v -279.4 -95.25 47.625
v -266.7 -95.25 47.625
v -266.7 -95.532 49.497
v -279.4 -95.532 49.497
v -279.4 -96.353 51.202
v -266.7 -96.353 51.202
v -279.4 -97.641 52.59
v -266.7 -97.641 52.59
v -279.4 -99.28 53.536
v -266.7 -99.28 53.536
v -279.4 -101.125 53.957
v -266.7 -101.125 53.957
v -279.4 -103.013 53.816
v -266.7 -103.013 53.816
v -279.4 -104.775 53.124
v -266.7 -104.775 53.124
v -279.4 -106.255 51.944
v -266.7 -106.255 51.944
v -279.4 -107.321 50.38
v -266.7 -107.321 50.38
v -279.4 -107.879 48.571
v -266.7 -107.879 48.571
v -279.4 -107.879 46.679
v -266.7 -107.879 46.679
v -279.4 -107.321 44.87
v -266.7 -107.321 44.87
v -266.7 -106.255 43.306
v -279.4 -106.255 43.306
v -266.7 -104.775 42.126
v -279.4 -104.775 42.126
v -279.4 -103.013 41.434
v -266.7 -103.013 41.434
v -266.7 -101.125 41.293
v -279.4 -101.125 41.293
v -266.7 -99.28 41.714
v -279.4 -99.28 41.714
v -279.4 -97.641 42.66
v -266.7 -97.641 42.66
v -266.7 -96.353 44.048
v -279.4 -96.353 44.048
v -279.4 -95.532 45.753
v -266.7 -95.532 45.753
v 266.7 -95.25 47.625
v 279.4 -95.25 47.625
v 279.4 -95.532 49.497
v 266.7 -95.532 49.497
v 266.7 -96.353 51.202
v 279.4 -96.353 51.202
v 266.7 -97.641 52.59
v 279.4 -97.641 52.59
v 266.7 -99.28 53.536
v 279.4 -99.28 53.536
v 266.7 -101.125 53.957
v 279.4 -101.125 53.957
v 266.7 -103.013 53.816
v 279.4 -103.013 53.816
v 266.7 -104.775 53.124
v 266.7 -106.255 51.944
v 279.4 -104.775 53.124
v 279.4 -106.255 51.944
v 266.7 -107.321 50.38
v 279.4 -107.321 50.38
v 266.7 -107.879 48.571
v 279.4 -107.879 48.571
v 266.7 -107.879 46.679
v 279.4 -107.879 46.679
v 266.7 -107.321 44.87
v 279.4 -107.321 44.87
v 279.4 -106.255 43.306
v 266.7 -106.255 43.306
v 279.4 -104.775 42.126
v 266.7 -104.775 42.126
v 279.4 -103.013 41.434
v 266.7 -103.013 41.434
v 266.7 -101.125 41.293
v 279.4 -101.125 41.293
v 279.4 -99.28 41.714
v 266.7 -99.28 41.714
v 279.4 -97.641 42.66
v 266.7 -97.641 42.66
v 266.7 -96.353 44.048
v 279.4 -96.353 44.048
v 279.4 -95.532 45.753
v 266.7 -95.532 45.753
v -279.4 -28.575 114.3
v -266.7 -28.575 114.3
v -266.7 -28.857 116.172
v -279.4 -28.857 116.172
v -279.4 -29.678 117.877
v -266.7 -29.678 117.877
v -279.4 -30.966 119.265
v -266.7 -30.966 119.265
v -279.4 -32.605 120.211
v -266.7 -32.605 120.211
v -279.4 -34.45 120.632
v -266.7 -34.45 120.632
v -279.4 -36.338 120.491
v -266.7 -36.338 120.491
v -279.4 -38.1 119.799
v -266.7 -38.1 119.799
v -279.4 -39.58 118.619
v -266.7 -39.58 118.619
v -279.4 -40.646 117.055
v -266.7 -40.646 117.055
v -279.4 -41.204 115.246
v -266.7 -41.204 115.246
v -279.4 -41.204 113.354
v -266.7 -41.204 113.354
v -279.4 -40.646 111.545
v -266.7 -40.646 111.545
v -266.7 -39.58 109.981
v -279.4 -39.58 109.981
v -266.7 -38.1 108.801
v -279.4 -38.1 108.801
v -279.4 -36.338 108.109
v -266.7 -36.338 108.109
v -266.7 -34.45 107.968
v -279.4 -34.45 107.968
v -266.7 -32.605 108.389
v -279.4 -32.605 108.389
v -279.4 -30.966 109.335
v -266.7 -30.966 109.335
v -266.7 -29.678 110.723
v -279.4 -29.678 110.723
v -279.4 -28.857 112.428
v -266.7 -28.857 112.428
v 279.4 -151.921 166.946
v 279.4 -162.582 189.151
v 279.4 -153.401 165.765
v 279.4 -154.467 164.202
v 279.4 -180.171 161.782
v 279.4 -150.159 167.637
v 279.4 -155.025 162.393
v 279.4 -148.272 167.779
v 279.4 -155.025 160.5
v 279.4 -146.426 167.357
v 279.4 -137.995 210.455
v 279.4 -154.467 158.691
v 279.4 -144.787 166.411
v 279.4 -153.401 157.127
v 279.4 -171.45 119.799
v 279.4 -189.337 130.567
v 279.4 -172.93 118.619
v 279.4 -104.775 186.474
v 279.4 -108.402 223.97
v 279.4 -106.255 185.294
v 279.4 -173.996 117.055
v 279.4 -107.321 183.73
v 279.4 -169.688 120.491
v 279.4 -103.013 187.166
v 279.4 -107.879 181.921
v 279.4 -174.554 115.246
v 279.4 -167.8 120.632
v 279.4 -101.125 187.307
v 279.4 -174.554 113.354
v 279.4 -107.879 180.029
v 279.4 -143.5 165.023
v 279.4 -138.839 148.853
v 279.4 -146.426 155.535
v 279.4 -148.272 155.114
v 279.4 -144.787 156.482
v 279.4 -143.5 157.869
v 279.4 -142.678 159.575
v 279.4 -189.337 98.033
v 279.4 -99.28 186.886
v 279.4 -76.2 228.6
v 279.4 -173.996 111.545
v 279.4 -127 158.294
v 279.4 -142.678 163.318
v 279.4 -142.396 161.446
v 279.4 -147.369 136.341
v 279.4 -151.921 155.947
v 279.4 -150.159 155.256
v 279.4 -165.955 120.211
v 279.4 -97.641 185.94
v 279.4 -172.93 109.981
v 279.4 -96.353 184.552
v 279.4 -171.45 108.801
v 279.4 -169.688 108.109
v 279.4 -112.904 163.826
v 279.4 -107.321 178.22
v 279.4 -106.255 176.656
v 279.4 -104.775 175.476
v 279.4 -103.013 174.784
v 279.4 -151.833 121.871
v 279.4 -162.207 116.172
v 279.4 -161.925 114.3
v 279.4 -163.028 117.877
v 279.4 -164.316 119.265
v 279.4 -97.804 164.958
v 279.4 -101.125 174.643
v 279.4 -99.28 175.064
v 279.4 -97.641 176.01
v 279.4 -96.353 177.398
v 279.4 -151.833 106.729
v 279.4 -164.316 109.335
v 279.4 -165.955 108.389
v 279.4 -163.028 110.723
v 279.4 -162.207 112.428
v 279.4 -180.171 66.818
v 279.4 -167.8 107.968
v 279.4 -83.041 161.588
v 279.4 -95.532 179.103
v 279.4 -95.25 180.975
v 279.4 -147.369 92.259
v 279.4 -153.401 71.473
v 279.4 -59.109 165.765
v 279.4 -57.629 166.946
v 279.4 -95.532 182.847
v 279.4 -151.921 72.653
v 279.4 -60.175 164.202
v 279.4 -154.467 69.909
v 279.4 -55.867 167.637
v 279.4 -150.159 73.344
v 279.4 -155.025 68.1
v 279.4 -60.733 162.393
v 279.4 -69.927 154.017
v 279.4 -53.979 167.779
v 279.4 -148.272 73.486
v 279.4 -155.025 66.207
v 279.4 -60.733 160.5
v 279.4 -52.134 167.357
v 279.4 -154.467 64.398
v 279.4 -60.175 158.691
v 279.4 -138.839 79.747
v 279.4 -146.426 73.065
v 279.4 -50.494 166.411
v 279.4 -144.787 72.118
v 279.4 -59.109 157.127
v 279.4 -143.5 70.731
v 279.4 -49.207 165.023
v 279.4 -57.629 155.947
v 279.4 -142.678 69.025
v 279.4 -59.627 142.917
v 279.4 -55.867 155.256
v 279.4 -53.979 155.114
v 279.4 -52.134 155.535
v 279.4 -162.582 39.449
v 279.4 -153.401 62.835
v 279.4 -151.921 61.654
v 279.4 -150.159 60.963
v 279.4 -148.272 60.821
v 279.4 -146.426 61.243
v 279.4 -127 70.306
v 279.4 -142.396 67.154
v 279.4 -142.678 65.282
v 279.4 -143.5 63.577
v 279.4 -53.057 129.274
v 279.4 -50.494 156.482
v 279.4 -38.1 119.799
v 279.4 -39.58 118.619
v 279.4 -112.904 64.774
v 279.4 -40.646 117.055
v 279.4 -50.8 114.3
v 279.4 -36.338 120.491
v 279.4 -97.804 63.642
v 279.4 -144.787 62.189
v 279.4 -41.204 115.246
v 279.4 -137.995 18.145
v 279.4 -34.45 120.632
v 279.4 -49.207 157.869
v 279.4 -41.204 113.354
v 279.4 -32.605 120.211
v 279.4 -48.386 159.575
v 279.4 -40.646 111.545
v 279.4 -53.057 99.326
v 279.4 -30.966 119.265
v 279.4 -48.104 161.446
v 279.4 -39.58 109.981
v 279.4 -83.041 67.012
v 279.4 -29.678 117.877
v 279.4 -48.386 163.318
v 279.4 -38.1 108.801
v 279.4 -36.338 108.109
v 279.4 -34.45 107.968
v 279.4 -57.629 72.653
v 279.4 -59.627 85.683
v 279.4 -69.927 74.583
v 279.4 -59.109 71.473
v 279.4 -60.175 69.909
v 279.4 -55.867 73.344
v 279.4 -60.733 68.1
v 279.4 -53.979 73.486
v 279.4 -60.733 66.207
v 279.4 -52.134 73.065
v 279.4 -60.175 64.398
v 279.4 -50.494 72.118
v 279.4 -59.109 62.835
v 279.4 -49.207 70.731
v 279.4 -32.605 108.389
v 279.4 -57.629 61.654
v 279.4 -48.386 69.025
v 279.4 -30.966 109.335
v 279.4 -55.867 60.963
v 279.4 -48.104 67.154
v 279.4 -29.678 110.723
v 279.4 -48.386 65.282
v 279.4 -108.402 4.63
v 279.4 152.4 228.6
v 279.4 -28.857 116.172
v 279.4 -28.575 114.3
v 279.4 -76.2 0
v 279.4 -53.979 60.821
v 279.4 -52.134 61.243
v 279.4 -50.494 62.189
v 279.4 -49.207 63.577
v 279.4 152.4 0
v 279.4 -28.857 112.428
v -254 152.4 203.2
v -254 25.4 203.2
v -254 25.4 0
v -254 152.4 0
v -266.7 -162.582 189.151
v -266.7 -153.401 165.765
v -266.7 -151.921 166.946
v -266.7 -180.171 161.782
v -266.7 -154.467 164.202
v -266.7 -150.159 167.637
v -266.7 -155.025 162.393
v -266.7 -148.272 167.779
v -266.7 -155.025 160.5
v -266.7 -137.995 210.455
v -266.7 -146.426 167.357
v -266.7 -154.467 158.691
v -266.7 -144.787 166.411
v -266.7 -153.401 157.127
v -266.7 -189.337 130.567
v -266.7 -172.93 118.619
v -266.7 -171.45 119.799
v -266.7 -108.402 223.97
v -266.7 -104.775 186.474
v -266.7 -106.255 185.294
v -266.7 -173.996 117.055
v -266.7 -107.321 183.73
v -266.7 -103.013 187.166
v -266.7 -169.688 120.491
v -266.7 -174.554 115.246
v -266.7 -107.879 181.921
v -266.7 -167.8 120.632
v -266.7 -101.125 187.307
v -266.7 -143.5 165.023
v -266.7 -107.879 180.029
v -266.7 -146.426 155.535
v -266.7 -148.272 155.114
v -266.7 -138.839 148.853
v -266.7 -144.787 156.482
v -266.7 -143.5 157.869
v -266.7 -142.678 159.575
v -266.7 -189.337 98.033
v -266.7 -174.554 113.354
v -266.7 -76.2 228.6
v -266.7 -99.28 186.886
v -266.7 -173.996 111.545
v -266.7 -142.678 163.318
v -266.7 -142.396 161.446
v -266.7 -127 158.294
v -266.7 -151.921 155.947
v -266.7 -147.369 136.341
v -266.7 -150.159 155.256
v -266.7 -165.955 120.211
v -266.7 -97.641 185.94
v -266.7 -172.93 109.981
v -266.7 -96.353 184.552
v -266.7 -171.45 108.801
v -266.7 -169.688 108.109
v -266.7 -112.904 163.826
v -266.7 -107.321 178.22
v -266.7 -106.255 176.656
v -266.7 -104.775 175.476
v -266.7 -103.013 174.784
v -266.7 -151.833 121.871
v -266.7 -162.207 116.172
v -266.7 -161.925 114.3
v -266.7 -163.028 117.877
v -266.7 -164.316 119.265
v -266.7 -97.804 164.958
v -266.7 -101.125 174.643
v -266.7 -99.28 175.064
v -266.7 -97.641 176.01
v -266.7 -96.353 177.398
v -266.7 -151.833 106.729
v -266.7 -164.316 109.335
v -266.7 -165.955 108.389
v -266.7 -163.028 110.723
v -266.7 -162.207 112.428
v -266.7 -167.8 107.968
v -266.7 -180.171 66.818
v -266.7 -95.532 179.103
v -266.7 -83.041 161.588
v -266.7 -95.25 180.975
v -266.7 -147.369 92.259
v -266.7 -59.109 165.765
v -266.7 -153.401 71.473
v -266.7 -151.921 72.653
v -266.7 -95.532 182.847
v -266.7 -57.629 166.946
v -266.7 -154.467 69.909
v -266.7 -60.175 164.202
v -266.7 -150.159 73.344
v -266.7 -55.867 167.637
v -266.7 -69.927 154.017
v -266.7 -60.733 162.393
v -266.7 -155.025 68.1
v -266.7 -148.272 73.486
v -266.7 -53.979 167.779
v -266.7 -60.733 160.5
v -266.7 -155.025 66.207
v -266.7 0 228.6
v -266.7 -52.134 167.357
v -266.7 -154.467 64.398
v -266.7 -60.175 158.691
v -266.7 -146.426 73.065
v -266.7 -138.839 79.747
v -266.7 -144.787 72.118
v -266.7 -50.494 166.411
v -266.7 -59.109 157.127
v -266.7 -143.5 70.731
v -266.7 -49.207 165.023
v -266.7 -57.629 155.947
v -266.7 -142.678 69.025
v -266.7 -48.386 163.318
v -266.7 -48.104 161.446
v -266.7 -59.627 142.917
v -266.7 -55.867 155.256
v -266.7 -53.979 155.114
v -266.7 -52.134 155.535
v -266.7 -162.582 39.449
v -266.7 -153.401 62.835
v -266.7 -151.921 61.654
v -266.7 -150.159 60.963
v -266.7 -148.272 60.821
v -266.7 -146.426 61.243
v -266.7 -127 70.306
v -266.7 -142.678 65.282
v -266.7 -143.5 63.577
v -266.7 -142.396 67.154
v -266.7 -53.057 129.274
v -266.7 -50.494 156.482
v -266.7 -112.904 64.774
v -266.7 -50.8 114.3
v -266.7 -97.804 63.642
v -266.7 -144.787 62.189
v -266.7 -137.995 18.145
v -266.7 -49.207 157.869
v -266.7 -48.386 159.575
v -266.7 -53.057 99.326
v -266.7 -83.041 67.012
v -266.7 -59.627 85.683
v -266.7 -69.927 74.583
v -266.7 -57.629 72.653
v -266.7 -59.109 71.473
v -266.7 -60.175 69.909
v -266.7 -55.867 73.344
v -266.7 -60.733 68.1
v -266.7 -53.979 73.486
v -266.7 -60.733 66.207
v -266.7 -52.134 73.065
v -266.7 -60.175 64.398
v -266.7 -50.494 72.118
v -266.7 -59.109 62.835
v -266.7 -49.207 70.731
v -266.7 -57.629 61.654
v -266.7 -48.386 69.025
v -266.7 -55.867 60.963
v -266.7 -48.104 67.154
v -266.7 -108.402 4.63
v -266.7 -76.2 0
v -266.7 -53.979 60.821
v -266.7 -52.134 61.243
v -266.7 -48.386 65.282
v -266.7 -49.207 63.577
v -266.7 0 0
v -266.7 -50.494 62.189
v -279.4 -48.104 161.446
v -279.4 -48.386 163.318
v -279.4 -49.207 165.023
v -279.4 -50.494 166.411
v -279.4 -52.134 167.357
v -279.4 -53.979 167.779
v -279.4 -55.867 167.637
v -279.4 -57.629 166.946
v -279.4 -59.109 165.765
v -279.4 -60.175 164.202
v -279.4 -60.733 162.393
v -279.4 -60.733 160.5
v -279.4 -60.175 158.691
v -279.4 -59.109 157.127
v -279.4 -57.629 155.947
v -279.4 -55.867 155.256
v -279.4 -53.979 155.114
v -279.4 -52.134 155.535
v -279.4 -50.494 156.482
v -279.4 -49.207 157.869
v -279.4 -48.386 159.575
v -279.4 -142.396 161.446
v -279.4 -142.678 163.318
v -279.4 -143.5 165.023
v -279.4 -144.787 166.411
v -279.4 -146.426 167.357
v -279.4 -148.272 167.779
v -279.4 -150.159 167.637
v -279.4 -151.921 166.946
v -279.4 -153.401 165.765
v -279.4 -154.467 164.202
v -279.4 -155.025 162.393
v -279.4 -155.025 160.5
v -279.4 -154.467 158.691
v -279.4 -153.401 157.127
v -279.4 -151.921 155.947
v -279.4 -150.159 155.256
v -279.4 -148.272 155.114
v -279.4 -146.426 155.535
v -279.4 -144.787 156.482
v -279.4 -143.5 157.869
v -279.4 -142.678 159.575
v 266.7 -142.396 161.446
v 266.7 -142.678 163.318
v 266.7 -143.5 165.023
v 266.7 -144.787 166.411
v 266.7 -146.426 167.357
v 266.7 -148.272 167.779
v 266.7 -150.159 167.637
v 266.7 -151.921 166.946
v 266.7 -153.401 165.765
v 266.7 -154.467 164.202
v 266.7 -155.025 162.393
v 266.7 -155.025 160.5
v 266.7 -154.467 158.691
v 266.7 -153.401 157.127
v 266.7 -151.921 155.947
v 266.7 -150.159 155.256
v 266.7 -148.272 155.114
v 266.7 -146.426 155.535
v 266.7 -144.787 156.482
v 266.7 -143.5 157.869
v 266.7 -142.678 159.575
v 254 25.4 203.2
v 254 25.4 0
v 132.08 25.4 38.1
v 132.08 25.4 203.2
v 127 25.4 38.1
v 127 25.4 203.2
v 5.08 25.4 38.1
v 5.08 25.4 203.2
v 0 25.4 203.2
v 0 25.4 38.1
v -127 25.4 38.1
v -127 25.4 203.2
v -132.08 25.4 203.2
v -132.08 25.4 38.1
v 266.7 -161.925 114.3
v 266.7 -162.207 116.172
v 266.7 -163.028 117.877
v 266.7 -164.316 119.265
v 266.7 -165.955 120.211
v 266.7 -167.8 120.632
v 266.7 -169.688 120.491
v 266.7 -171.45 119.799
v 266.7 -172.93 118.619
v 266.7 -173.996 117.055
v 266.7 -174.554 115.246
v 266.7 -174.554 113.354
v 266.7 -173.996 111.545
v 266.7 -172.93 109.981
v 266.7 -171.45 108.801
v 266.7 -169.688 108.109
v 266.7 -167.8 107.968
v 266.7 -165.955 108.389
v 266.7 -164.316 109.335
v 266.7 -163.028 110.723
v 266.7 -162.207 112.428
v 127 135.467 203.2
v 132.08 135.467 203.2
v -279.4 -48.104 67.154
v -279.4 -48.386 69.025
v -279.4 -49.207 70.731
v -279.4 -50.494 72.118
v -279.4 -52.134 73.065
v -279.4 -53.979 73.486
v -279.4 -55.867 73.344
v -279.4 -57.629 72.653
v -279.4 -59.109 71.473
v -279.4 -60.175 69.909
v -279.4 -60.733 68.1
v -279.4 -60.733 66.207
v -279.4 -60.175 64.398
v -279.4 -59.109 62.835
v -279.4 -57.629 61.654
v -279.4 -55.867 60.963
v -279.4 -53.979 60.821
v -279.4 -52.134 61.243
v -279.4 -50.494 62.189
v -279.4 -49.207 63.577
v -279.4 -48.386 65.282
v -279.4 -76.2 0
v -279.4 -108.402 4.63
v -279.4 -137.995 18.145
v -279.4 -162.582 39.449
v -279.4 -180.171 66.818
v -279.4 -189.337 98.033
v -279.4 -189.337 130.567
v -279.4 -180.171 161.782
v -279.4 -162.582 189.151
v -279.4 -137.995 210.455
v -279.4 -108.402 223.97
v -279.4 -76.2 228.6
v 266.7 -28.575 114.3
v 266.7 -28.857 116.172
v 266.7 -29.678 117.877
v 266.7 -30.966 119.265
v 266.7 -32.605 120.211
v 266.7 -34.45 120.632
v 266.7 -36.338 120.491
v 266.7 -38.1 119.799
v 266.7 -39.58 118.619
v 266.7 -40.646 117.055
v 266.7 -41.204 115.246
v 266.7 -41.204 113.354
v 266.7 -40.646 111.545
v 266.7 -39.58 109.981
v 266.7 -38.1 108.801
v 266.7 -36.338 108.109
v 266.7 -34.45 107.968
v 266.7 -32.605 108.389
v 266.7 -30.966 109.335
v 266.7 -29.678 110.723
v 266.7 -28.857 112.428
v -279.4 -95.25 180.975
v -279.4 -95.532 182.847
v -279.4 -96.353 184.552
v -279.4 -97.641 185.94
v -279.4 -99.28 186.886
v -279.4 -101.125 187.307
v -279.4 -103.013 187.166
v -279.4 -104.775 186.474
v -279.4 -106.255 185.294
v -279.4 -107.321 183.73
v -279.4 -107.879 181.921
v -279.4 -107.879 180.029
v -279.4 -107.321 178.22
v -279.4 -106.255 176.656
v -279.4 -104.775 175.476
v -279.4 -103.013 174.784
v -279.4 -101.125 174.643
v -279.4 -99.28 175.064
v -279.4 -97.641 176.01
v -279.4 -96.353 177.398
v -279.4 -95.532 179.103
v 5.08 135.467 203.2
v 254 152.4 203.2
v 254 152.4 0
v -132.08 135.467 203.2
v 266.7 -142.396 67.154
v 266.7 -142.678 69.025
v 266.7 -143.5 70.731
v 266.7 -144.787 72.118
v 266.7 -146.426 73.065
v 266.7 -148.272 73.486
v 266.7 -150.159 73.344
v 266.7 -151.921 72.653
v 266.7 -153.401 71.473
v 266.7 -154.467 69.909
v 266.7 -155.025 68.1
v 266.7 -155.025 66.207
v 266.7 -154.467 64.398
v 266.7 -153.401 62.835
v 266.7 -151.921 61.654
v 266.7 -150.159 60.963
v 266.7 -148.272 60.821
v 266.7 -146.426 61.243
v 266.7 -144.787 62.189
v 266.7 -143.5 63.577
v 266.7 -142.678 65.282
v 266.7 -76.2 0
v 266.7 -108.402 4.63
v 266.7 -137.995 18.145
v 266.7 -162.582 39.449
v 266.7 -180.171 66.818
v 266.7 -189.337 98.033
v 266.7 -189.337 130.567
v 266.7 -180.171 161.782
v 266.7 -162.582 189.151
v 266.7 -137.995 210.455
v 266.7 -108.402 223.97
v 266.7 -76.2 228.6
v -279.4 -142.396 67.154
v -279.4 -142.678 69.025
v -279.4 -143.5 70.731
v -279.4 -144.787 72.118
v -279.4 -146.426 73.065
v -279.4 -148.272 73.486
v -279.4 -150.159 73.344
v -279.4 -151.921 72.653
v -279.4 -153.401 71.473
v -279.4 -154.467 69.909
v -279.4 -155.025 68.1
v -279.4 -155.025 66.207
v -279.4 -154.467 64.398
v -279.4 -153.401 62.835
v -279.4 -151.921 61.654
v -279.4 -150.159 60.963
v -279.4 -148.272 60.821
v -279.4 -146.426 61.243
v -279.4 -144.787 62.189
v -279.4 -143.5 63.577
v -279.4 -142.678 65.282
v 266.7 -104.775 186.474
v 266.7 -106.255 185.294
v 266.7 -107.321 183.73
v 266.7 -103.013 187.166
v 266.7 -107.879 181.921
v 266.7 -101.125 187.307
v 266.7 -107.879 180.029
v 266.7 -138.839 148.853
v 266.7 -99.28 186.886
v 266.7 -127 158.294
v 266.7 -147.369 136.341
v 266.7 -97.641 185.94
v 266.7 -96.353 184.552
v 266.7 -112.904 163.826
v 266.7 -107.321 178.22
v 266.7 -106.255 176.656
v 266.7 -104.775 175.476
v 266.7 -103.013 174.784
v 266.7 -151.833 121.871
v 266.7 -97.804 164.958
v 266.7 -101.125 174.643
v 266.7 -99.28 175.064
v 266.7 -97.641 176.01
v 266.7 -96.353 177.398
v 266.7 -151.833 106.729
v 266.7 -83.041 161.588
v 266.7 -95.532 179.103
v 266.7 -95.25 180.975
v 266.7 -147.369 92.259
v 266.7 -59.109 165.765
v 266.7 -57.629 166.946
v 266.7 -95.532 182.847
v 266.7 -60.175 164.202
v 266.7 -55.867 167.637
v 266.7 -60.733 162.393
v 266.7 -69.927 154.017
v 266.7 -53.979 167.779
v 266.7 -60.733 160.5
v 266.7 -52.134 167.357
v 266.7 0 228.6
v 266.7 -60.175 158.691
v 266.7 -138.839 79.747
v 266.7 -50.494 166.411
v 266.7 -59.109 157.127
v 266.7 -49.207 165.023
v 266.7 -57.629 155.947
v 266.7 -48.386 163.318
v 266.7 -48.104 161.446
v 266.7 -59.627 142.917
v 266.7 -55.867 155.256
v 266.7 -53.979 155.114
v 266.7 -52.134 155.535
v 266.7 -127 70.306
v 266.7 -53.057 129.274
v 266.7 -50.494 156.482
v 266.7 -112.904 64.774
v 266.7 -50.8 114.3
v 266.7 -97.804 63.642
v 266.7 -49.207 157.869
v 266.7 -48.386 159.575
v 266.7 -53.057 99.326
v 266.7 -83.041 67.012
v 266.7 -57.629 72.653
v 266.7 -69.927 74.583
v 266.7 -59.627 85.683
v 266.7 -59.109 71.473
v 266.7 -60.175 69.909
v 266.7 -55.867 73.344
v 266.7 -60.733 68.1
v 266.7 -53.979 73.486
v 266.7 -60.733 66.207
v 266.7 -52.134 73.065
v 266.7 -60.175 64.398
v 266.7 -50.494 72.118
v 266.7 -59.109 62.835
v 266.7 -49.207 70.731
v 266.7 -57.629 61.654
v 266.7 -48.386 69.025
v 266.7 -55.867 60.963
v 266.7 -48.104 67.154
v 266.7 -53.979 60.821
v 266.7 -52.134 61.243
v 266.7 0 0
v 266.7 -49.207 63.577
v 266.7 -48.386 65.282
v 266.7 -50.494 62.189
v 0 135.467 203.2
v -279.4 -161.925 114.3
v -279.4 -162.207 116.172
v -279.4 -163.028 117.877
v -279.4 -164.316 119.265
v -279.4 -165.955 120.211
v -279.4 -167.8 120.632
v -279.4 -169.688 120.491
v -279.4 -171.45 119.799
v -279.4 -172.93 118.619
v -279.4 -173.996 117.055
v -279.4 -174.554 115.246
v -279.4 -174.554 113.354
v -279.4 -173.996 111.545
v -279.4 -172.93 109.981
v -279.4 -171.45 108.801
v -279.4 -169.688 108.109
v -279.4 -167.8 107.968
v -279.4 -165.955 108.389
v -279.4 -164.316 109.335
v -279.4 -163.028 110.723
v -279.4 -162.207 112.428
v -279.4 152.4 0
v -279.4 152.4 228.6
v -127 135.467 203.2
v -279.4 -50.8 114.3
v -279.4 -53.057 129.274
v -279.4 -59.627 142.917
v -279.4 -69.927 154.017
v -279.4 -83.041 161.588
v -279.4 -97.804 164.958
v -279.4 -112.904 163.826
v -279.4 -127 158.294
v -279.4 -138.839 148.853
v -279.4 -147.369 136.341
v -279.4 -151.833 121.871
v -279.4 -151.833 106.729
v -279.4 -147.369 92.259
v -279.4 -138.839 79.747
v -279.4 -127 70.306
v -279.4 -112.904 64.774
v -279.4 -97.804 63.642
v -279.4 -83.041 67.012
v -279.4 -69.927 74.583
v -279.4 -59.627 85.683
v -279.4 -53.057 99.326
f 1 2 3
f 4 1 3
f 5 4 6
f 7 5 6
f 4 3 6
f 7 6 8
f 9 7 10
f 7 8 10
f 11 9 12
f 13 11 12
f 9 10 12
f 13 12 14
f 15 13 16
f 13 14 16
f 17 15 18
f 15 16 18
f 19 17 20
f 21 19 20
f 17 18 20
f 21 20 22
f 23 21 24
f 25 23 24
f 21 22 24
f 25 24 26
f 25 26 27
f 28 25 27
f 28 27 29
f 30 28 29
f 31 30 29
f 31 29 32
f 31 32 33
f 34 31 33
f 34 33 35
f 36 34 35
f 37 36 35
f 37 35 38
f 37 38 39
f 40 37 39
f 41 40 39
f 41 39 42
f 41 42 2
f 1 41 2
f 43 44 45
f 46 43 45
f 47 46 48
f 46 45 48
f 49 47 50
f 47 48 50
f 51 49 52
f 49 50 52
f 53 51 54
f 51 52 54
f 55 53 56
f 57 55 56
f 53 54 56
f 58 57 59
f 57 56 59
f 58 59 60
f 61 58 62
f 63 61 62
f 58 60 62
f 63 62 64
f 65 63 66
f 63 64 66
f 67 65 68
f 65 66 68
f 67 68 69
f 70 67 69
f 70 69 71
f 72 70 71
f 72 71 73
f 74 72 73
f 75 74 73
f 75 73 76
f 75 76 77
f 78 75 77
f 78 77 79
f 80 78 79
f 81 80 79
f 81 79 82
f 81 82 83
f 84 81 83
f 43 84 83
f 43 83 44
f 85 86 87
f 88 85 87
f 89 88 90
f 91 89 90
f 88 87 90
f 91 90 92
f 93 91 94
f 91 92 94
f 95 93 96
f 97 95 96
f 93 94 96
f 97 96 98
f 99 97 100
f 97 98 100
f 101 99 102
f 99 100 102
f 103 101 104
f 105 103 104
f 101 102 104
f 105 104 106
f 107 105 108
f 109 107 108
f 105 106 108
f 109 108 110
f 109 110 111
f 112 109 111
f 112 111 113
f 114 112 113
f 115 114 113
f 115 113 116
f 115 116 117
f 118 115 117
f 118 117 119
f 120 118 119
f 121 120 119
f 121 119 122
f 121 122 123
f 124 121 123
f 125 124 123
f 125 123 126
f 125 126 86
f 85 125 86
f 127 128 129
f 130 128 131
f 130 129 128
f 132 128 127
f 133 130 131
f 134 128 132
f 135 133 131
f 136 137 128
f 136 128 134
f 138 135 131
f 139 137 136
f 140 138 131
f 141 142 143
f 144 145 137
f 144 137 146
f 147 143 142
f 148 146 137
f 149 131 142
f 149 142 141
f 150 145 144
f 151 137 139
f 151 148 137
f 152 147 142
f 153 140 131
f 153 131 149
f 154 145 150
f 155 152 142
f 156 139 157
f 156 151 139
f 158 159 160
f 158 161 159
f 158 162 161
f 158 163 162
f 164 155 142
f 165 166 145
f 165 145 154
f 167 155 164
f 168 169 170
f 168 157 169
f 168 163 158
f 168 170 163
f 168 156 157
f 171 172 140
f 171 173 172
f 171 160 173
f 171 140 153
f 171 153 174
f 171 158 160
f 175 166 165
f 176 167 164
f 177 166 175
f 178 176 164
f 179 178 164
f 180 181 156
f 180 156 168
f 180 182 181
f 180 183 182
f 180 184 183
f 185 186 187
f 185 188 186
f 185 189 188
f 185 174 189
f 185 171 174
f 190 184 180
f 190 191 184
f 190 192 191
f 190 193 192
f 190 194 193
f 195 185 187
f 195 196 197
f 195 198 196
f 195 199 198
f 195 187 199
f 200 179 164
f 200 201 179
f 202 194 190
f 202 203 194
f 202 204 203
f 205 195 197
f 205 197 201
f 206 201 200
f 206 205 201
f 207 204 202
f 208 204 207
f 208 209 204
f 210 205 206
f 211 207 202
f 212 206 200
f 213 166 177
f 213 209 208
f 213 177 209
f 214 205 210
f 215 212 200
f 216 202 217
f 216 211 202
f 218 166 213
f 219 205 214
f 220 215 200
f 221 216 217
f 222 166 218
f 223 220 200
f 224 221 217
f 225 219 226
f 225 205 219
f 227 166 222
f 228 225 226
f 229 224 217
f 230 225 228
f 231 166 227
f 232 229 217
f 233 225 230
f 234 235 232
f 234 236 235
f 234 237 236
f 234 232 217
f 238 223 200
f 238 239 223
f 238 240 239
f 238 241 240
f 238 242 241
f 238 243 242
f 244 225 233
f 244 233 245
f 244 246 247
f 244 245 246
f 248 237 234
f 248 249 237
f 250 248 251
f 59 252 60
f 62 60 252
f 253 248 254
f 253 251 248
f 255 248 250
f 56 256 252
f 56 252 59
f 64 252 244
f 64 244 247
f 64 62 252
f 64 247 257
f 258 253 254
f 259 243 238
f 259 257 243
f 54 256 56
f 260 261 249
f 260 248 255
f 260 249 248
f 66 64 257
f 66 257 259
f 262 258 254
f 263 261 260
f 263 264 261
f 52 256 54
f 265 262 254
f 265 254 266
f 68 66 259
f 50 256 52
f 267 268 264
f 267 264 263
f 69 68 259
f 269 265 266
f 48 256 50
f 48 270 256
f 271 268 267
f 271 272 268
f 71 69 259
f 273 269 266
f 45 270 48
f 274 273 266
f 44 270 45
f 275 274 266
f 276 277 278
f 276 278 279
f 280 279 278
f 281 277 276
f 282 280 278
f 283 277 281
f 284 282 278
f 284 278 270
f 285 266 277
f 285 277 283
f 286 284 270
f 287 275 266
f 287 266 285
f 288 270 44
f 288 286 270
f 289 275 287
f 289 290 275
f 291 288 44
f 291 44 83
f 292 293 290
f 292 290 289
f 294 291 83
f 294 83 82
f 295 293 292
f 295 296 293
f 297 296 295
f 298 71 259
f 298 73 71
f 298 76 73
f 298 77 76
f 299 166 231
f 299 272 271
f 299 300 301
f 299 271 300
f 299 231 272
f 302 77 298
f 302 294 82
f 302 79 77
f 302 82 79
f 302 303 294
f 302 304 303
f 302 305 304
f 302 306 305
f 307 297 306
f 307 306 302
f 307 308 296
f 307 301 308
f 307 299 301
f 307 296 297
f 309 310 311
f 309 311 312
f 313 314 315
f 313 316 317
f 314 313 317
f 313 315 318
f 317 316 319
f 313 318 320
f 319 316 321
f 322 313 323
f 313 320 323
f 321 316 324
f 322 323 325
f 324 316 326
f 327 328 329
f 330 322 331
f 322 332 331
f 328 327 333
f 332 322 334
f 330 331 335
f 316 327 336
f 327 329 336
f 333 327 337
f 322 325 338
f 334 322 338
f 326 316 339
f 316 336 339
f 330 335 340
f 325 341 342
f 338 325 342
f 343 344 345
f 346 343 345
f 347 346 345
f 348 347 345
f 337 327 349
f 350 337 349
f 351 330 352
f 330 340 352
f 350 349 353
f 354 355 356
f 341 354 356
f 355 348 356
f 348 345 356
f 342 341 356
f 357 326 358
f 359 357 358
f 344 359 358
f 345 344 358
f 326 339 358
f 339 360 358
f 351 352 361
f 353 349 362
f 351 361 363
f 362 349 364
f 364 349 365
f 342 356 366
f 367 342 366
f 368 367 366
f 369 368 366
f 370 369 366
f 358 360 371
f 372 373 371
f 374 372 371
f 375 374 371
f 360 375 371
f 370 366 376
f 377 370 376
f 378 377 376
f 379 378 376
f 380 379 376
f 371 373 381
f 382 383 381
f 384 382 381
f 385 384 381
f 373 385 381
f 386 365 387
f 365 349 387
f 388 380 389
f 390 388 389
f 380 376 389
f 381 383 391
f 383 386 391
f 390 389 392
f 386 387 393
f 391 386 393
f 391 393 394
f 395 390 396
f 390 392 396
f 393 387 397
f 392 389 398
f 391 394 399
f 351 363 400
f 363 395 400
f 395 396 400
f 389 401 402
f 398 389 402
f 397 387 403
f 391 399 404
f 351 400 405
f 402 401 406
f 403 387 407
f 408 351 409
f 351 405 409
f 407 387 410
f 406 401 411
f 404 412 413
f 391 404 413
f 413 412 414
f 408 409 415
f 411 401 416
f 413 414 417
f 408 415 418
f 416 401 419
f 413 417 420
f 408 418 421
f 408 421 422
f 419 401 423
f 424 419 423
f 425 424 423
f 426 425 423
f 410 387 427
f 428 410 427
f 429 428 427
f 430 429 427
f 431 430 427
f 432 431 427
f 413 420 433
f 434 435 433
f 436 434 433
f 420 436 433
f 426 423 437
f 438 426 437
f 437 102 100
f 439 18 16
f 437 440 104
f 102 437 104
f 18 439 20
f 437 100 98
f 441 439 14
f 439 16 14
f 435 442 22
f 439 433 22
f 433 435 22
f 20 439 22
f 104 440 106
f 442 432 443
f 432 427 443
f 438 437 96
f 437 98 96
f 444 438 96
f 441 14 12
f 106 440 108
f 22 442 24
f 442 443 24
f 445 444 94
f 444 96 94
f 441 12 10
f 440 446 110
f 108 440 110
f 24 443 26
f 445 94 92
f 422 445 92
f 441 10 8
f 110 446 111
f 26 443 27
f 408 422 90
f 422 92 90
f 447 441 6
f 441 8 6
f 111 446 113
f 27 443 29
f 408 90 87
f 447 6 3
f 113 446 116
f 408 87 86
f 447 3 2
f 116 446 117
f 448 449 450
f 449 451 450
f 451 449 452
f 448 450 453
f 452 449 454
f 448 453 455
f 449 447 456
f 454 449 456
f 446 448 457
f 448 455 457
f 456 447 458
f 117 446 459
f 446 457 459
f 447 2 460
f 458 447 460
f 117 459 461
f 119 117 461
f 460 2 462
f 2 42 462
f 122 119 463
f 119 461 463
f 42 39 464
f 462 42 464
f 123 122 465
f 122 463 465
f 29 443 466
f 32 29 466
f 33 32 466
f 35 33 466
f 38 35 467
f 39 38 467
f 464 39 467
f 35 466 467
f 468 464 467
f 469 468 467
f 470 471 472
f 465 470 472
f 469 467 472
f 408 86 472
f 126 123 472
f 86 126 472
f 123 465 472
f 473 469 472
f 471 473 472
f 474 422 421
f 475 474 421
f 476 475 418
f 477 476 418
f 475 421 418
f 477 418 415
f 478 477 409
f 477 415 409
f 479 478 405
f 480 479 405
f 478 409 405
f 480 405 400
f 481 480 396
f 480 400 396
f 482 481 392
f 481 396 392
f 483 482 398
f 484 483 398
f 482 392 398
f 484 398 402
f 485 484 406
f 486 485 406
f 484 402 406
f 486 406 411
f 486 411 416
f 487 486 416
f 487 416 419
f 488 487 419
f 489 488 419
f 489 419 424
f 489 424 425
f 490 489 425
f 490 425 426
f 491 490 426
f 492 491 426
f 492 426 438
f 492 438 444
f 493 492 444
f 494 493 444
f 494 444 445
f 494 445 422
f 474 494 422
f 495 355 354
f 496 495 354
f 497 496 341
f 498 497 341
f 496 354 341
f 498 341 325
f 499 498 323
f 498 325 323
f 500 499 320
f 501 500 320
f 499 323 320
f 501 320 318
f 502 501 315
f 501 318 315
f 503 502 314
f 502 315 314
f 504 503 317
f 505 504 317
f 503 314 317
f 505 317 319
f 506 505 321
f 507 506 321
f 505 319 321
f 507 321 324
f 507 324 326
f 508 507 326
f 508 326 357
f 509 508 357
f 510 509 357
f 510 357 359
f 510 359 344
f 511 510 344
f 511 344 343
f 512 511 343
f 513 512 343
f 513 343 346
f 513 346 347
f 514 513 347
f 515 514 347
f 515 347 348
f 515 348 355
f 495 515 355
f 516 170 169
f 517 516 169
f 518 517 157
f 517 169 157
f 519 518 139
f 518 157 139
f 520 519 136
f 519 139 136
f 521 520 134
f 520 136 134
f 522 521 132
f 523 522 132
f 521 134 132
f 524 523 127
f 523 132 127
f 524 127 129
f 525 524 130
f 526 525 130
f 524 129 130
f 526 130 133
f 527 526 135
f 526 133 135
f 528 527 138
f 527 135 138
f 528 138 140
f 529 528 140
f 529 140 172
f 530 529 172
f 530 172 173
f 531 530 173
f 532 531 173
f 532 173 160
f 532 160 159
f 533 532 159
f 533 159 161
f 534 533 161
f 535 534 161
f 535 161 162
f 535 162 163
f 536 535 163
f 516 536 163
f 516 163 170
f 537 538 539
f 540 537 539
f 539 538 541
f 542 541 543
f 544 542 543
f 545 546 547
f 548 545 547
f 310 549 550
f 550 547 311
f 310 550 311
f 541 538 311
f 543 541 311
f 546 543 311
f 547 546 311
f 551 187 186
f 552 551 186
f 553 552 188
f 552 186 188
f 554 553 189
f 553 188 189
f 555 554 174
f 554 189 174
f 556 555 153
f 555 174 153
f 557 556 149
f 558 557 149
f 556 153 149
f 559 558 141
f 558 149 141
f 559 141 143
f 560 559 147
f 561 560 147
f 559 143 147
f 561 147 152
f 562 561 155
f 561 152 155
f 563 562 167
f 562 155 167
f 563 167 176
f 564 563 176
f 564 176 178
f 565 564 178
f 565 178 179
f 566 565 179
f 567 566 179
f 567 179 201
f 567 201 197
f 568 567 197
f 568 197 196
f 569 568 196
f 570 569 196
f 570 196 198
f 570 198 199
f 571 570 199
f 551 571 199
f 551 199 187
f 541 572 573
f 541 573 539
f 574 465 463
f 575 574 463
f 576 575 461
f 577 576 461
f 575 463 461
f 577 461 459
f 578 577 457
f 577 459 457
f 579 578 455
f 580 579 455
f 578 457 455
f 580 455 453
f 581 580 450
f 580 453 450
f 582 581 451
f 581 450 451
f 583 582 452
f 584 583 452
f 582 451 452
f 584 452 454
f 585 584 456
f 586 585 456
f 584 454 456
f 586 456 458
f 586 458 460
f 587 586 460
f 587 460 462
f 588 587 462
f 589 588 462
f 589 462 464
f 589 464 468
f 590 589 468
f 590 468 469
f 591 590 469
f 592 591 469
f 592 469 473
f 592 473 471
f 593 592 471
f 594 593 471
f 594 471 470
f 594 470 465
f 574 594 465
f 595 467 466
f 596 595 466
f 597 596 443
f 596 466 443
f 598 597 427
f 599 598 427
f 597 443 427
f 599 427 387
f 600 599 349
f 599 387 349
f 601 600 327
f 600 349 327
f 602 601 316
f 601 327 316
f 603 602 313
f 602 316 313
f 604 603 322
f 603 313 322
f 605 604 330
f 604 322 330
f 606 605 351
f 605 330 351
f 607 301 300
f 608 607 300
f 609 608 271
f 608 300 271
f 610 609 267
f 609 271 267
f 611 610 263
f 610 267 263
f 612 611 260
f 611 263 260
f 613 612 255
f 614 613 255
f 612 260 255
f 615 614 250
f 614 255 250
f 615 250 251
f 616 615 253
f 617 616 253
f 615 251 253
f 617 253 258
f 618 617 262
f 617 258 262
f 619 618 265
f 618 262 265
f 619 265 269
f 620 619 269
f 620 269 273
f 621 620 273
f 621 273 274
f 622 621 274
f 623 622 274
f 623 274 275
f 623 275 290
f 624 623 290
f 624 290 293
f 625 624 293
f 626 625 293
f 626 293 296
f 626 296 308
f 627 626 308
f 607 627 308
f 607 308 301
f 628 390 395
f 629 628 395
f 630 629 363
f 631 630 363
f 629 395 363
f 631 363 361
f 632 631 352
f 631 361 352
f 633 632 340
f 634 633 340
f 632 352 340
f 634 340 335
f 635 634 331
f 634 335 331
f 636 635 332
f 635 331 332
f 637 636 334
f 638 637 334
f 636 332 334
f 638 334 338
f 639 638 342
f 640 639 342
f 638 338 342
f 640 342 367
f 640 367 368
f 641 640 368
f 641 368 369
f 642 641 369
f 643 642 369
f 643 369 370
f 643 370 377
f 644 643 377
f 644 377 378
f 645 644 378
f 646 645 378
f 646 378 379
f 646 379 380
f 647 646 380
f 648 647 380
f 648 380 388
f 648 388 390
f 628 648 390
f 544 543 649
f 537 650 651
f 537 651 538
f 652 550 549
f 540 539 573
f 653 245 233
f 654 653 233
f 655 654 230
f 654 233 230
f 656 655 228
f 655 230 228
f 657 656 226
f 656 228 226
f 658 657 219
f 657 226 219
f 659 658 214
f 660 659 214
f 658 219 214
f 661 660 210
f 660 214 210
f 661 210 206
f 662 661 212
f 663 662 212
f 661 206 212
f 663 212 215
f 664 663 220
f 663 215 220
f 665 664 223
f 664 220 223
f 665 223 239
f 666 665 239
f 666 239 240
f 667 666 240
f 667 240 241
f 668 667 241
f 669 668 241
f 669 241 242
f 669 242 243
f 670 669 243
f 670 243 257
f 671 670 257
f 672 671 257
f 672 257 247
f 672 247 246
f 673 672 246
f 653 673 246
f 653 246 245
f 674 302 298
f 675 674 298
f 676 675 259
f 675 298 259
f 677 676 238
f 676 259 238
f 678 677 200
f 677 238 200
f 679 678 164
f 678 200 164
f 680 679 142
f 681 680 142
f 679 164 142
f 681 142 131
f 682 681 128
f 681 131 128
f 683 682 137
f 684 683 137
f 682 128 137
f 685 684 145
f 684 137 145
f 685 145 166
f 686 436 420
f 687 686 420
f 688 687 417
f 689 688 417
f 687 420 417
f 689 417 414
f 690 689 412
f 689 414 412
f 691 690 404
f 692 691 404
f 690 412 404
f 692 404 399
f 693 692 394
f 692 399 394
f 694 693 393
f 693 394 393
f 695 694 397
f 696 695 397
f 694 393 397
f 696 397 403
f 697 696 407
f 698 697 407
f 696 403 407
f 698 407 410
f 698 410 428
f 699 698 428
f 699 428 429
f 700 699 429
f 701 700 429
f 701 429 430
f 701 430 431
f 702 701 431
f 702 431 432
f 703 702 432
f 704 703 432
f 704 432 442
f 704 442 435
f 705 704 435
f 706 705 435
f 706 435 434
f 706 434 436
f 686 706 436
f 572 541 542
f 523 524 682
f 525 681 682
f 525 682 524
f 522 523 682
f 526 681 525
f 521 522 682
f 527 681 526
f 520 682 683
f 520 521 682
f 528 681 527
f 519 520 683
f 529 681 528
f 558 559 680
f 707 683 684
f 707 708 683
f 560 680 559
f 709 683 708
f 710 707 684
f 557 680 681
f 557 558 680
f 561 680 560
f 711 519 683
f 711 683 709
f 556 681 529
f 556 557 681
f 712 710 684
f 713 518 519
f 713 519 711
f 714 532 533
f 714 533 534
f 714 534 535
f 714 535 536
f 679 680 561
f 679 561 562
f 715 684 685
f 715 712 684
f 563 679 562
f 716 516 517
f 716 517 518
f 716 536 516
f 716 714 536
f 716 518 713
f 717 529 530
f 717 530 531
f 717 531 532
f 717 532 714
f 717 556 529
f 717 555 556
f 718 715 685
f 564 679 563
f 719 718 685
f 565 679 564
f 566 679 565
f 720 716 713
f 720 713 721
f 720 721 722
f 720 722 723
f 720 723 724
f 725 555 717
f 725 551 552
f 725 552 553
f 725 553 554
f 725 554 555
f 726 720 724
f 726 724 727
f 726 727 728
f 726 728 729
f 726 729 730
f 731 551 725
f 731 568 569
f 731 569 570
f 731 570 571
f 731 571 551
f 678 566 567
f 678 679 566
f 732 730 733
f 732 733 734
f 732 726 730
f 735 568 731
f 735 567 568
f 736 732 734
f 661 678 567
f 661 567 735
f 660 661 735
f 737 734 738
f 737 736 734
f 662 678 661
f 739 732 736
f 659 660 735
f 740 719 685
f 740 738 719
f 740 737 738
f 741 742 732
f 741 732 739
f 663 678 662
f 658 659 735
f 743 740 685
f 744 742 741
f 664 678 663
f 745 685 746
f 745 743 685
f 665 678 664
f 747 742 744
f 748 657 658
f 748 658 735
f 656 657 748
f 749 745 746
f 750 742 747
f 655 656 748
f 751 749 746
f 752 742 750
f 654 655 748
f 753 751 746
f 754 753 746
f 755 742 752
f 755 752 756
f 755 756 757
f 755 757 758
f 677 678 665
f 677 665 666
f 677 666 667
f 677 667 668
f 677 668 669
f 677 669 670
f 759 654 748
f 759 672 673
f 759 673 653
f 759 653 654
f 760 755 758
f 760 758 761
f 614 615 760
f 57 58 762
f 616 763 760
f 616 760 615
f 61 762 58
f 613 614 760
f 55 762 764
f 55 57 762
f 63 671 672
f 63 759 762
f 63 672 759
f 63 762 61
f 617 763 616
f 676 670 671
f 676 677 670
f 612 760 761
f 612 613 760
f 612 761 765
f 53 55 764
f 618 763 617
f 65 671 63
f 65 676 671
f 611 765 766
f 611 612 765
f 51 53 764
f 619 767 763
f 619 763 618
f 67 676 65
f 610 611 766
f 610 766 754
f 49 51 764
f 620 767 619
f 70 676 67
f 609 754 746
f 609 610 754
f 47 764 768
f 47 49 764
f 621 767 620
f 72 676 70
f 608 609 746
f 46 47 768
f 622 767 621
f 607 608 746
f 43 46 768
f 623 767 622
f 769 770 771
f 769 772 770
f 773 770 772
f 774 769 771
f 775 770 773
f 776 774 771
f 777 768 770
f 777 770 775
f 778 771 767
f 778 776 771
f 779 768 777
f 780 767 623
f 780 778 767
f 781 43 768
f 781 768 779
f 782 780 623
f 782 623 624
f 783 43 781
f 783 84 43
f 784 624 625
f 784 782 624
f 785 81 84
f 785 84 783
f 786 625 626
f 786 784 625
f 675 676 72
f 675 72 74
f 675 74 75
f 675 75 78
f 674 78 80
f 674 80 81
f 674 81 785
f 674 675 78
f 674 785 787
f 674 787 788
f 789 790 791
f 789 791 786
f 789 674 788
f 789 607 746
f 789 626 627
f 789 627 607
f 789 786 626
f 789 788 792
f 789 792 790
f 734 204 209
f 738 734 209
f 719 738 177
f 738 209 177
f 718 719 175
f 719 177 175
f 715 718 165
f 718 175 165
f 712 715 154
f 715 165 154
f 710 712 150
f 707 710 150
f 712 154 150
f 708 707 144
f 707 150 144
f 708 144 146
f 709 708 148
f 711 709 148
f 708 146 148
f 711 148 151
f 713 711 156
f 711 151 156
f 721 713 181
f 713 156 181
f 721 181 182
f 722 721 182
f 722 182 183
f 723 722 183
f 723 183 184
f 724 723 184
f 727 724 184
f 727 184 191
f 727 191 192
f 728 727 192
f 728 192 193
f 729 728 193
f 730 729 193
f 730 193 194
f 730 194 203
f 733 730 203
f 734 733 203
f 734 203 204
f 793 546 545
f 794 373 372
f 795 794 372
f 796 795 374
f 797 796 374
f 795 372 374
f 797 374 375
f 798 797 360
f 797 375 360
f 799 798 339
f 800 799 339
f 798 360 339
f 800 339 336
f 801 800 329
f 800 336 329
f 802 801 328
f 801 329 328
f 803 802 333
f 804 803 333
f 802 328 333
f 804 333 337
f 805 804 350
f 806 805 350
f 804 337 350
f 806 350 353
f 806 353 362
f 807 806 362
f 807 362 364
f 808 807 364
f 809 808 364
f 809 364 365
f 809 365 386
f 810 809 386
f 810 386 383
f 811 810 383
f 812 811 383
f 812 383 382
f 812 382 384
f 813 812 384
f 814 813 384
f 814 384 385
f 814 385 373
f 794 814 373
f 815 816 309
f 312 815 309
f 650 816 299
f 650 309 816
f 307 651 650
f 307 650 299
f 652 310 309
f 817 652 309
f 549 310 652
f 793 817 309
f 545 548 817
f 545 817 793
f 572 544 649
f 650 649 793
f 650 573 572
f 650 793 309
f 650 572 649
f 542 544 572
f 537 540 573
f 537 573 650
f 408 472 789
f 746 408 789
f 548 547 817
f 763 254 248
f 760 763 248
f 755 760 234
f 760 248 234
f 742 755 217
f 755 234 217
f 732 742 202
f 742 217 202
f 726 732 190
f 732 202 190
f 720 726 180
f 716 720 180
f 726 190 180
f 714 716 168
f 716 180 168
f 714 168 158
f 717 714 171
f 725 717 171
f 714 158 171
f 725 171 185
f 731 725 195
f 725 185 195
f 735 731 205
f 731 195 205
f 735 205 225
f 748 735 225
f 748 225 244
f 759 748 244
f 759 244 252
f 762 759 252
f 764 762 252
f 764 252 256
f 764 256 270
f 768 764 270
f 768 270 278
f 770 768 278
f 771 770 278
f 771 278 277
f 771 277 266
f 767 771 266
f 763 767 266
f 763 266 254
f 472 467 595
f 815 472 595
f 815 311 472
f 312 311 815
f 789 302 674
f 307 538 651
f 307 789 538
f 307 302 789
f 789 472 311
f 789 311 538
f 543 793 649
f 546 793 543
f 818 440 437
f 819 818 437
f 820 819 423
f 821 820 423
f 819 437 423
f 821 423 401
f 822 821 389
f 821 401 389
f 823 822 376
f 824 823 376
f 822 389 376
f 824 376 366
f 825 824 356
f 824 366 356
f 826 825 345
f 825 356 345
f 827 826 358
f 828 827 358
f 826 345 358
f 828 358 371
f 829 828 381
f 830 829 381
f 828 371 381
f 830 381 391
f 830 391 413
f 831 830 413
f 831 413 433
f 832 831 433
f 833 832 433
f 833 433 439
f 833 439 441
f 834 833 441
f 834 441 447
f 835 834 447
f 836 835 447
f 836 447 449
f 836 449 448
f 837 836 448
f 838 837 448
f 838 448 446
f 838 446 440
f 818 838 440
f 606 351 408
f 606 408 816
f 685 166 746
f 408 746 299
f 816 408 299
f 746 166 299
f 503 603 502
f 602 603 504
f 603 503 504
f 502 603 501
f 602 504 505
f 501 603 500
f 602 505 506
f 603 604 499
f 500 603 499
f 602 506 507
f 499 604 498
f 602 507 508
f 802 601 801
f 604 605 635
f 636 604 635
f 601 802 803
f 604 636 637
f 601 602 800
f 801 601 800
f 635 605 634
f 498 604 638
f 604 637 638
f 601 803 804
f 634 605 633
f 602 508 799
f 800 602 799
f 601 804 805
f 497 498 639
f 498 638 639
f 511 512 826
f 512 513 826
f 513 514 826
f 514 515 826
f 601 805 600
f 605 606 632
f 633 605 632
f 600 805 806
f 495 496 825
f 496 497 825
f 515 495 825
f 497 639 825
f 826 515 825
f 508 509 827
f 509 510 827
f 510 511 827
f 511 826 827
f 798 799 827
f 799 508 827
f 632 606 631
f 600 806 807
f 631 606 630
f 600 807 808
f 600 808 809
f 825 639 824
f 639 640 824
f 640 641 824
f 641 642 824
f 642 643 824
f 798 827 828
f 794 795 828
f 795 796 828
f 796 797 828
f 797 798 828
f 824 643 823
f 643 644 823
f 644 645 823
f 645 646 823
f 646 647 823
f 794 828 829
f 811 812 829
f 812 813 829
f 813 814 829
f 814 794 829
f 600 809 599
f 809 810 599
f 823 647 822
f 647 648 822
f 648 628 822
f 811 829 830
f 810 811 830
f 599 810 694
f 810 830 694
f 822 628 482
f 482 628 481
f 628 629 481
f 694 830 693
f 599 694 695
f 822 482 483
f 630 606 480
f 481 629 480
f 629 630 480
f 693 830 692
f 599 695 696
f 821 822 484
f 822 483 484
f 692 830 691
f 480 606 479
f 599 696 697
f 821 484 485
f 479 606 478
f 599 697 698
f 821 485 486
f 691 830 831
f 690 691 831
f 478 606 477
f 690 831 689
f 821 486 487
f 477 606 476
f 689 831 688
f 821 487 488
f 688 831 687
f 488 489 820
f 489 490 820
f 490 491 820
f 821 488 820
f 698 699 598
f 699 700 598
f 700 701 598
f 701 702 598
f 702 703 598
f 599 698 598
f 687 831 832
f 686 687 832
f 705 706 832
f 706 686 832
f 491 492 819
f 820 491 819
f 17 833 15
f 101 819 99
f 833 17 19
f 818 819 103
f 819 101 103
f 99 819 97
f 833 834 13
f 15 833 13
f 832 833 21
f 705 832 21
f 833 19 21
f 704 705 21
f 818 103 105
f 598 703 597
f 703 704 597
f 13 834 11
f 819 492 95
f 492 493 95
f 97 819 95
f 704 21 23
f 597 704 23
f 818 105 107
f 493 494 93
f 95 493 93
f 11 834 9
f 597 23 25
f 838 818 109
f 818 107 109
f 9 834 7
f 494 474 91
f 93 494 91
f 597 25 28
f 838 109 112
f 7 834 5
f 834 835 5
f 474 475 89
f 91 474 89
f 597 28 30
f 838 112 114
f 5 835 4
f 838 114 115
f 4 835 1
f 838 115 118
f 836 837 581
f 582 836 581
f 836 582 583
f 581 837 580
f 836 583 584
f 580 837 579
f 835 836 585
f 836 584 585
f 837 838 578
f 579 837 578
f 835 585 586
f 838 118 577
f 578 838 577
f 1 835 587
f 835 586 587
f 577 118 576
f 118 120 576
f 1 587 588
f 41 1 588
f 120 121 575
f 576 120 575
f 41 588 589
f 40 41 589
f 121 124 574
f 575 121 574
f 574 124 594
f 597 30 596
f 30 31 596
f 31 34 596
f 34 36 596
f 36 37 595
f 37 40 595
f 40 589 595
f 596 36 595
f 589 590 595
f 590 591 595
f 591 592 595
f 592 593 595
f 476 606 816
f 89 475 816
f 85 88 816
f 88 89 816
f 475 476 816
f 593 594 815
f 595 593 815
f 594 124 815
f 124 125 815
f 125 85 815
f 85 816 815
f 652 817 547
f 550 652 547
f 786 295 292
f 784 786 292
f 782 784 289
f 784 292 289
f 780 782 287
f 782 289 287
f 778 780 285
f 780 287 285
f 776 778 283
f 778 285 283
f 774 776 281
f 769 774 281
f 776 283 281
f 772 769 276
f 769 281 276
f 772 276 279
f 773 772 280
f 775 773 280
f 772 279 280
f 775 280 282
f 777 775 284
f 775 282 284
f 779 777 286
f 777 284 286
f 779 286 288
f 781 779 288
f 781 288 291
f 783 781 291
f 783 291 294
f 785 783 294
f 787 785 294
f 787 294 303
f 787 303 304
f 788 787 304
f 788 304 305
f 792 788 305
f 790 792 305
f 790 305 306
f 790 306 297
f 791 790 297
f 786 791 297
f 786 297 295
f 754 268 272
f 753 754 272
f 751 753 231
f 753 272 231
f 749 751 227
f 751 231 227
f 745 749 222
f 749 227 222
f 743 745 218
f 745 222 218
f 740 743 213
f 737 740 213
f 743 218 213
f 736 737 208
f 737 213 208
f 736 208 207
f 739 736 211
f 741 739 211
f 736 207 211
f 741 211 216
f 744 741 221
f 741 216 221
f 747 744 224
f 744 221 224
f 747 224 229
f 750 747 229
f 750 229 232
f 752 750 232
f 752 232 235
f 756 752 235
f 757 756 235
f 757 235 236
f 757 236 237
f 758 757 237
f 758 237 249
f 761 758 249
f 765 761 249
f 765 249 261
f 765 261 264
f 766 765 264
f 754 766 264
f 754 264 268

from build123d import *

# Parameters (mm, degrees)
BOSS_EXTRUDE2_DEPTH = 203.2
SKETCH2_W           = 558.8
SKETCH2_H           = 25.4
BOSS_EXTRUDE3_DEPTH = 152.4
BOSS_EXTRUDE4_DEPTH = 5.08
BOSS_EXTRUDE5_DEPTH = 5.08
BOSS_EXTRUDE6_DEPTH = 5.08
BOSS_EXTRUDE7_DEPTH = 558.8
SKETCH7_W           = 533.4
SKETCH7_H           = 190.5
CUT_EXTRUDE1_DEPTH  = 298.590683842
SKETCH8_R           = 50.8
CUT_EXTRUDE2_DEPTH  = 634.092133895
SKETCH10_R          = 6.35
CUT_EXTRUDE3_DEPTH  = 634.092133895


with BuildPart() as part:
    # Sketch1 → Boss-Extrude2 (new body)
    with BuildSketch(Plane.XY):
        Polygon((-279.4, 0), (279.4, 0), (279.4, 152.4), (254, 152.4), (254, 25.4), (-254, 25.4), (-254, 152.4), (-279.4, 152.4), align=None)
    extrude(amount=BOSS_EXTRUDE2_DEPTH)

    # Sketch2 → Boss-Extrude3 (add)
    with BuildSketch(Plane(origin=(0, 0, 0), x_dir=(1, 0, 0), z_dir=(0, 1, 0))):
        with Locations((0, -215.9)):
            Rectangle(SKETCH2_W, SKETCH2_H)
    extrude(amount=BOSS_EXTRUDE3_DEPTH)

    # Sketch3 → Boss-Extrude4 (add)
    with BuildSketch(Plane(origin=(127, 0, 0), x_dir=(0, 0, -1), z_dir=(1, 0, 0))):
        Polygon((-228.6, 152.4), (0, 0), (-228.6, 0), align=None)
    extrude(amount=BOSS_EXTRUDE4_DEPTH)

    # Sketch4 → Boss-Extrude5 (add)
    with BuildSketch(Plane(origin=(0, 0, 0), x_dir=(0, 0, -1), z_dir=(1, 0, 0))):
        Polygon((-228.6, 152.4), (0, 0), (-228.6, 0), align=None)
    extrude(amount=BOSS_EXTRUDE5_DEPTH)

    # Sketch5 → Boss-Extrude6 (add)
    with BuildSketch(Plane(origin=(-127, 0, 0), x_dir=(0, 0, -1), z_dir=(1, 0, 0))):
        Polygon((-228.6, 152.4), (0, 0), (-228.6, 0), align=None)
    extrude(amount=-BOSS_EXTRUDE6_DEPTH)

    # Sketch6 → Boss-Extrude7 (add)
    with BuildSketch(Plane(origin=(279.4, 0, 0), x_dir=(0, 0, -1), z_dir=(1, 0, 0))):
        with BuildLine():
            Line((0, 0), (-228.6, 0))
            Line((-228.6, 0), (-228.6, -76.2))
            ThreePointArc((-228.6, -76.2), (-114.3, -190.5), (0, -76.2))
            Line((0, -76.2), (0, 0))
        make_face()
    extrude(amount=-BOSS_EXTRUDE7_DEPTH)

    # Sketch7 → Cut-Extrude1 (cut)
    with BuildSketch(Plane.XY):
        with Locations((0, -95.25)):
            Rectangle(SKETCH7_W, SKETCH7_H)
    extrude(amount=CUT_EXTRUDE1_DEPTH, mode=Mode.SUBTRACT)

    # Sketch8 → Cut-Extrude2 (cut, through all)
    with BuildSketch(Plane(origin=(279.4, 0, 0), x_dir=(0, 0, -1), z_dir=(1, 0, 0))):
        with Locations((-114.3, -101.6)):
            Circle(SKETCH8_R)
    extrude(amount=-CUT_EXTRUDE2_DEPTH, mode=Mode.SUBTRACT)

    # Sketch10 → Cut-Extrude3 (cut, through all)
    with BuildSketch(Plane(origin=(279.4, 0, 0), x_dir=(0, 0, -1), z_dir=(1, 0, 0))):
        with Locations((-114.3, -34.925)):
            Circle(SKETCH10_R)
        with Locations((-67.153655364, -54.453655364)):
            Circle(SKETCH10_R)
        with Locations((-47.625, -101.6)):
            Circle(SKETCH10_R)
        with Locations((-67.153655364, -148.746344636)):
            Circle(SKETCH10_R)
        with Locations((-114.3, -168.275)):
            Circle(SKETCH10_R)
        with Locations((-161.446344636, -148.746344636)):
            Circle(SKETCH10_R)
        with Locations((-180.975, -101.6)):
            Circle(SKETCH10_R)
        with Locations((-161.446344636, -54.453655364)):
            Circle(SKETCH10_R)
    extrude(amount=-CUT_EXTRUDE3_DEPTH, mode=Mode.SUBTRACT)


solid = part.part
